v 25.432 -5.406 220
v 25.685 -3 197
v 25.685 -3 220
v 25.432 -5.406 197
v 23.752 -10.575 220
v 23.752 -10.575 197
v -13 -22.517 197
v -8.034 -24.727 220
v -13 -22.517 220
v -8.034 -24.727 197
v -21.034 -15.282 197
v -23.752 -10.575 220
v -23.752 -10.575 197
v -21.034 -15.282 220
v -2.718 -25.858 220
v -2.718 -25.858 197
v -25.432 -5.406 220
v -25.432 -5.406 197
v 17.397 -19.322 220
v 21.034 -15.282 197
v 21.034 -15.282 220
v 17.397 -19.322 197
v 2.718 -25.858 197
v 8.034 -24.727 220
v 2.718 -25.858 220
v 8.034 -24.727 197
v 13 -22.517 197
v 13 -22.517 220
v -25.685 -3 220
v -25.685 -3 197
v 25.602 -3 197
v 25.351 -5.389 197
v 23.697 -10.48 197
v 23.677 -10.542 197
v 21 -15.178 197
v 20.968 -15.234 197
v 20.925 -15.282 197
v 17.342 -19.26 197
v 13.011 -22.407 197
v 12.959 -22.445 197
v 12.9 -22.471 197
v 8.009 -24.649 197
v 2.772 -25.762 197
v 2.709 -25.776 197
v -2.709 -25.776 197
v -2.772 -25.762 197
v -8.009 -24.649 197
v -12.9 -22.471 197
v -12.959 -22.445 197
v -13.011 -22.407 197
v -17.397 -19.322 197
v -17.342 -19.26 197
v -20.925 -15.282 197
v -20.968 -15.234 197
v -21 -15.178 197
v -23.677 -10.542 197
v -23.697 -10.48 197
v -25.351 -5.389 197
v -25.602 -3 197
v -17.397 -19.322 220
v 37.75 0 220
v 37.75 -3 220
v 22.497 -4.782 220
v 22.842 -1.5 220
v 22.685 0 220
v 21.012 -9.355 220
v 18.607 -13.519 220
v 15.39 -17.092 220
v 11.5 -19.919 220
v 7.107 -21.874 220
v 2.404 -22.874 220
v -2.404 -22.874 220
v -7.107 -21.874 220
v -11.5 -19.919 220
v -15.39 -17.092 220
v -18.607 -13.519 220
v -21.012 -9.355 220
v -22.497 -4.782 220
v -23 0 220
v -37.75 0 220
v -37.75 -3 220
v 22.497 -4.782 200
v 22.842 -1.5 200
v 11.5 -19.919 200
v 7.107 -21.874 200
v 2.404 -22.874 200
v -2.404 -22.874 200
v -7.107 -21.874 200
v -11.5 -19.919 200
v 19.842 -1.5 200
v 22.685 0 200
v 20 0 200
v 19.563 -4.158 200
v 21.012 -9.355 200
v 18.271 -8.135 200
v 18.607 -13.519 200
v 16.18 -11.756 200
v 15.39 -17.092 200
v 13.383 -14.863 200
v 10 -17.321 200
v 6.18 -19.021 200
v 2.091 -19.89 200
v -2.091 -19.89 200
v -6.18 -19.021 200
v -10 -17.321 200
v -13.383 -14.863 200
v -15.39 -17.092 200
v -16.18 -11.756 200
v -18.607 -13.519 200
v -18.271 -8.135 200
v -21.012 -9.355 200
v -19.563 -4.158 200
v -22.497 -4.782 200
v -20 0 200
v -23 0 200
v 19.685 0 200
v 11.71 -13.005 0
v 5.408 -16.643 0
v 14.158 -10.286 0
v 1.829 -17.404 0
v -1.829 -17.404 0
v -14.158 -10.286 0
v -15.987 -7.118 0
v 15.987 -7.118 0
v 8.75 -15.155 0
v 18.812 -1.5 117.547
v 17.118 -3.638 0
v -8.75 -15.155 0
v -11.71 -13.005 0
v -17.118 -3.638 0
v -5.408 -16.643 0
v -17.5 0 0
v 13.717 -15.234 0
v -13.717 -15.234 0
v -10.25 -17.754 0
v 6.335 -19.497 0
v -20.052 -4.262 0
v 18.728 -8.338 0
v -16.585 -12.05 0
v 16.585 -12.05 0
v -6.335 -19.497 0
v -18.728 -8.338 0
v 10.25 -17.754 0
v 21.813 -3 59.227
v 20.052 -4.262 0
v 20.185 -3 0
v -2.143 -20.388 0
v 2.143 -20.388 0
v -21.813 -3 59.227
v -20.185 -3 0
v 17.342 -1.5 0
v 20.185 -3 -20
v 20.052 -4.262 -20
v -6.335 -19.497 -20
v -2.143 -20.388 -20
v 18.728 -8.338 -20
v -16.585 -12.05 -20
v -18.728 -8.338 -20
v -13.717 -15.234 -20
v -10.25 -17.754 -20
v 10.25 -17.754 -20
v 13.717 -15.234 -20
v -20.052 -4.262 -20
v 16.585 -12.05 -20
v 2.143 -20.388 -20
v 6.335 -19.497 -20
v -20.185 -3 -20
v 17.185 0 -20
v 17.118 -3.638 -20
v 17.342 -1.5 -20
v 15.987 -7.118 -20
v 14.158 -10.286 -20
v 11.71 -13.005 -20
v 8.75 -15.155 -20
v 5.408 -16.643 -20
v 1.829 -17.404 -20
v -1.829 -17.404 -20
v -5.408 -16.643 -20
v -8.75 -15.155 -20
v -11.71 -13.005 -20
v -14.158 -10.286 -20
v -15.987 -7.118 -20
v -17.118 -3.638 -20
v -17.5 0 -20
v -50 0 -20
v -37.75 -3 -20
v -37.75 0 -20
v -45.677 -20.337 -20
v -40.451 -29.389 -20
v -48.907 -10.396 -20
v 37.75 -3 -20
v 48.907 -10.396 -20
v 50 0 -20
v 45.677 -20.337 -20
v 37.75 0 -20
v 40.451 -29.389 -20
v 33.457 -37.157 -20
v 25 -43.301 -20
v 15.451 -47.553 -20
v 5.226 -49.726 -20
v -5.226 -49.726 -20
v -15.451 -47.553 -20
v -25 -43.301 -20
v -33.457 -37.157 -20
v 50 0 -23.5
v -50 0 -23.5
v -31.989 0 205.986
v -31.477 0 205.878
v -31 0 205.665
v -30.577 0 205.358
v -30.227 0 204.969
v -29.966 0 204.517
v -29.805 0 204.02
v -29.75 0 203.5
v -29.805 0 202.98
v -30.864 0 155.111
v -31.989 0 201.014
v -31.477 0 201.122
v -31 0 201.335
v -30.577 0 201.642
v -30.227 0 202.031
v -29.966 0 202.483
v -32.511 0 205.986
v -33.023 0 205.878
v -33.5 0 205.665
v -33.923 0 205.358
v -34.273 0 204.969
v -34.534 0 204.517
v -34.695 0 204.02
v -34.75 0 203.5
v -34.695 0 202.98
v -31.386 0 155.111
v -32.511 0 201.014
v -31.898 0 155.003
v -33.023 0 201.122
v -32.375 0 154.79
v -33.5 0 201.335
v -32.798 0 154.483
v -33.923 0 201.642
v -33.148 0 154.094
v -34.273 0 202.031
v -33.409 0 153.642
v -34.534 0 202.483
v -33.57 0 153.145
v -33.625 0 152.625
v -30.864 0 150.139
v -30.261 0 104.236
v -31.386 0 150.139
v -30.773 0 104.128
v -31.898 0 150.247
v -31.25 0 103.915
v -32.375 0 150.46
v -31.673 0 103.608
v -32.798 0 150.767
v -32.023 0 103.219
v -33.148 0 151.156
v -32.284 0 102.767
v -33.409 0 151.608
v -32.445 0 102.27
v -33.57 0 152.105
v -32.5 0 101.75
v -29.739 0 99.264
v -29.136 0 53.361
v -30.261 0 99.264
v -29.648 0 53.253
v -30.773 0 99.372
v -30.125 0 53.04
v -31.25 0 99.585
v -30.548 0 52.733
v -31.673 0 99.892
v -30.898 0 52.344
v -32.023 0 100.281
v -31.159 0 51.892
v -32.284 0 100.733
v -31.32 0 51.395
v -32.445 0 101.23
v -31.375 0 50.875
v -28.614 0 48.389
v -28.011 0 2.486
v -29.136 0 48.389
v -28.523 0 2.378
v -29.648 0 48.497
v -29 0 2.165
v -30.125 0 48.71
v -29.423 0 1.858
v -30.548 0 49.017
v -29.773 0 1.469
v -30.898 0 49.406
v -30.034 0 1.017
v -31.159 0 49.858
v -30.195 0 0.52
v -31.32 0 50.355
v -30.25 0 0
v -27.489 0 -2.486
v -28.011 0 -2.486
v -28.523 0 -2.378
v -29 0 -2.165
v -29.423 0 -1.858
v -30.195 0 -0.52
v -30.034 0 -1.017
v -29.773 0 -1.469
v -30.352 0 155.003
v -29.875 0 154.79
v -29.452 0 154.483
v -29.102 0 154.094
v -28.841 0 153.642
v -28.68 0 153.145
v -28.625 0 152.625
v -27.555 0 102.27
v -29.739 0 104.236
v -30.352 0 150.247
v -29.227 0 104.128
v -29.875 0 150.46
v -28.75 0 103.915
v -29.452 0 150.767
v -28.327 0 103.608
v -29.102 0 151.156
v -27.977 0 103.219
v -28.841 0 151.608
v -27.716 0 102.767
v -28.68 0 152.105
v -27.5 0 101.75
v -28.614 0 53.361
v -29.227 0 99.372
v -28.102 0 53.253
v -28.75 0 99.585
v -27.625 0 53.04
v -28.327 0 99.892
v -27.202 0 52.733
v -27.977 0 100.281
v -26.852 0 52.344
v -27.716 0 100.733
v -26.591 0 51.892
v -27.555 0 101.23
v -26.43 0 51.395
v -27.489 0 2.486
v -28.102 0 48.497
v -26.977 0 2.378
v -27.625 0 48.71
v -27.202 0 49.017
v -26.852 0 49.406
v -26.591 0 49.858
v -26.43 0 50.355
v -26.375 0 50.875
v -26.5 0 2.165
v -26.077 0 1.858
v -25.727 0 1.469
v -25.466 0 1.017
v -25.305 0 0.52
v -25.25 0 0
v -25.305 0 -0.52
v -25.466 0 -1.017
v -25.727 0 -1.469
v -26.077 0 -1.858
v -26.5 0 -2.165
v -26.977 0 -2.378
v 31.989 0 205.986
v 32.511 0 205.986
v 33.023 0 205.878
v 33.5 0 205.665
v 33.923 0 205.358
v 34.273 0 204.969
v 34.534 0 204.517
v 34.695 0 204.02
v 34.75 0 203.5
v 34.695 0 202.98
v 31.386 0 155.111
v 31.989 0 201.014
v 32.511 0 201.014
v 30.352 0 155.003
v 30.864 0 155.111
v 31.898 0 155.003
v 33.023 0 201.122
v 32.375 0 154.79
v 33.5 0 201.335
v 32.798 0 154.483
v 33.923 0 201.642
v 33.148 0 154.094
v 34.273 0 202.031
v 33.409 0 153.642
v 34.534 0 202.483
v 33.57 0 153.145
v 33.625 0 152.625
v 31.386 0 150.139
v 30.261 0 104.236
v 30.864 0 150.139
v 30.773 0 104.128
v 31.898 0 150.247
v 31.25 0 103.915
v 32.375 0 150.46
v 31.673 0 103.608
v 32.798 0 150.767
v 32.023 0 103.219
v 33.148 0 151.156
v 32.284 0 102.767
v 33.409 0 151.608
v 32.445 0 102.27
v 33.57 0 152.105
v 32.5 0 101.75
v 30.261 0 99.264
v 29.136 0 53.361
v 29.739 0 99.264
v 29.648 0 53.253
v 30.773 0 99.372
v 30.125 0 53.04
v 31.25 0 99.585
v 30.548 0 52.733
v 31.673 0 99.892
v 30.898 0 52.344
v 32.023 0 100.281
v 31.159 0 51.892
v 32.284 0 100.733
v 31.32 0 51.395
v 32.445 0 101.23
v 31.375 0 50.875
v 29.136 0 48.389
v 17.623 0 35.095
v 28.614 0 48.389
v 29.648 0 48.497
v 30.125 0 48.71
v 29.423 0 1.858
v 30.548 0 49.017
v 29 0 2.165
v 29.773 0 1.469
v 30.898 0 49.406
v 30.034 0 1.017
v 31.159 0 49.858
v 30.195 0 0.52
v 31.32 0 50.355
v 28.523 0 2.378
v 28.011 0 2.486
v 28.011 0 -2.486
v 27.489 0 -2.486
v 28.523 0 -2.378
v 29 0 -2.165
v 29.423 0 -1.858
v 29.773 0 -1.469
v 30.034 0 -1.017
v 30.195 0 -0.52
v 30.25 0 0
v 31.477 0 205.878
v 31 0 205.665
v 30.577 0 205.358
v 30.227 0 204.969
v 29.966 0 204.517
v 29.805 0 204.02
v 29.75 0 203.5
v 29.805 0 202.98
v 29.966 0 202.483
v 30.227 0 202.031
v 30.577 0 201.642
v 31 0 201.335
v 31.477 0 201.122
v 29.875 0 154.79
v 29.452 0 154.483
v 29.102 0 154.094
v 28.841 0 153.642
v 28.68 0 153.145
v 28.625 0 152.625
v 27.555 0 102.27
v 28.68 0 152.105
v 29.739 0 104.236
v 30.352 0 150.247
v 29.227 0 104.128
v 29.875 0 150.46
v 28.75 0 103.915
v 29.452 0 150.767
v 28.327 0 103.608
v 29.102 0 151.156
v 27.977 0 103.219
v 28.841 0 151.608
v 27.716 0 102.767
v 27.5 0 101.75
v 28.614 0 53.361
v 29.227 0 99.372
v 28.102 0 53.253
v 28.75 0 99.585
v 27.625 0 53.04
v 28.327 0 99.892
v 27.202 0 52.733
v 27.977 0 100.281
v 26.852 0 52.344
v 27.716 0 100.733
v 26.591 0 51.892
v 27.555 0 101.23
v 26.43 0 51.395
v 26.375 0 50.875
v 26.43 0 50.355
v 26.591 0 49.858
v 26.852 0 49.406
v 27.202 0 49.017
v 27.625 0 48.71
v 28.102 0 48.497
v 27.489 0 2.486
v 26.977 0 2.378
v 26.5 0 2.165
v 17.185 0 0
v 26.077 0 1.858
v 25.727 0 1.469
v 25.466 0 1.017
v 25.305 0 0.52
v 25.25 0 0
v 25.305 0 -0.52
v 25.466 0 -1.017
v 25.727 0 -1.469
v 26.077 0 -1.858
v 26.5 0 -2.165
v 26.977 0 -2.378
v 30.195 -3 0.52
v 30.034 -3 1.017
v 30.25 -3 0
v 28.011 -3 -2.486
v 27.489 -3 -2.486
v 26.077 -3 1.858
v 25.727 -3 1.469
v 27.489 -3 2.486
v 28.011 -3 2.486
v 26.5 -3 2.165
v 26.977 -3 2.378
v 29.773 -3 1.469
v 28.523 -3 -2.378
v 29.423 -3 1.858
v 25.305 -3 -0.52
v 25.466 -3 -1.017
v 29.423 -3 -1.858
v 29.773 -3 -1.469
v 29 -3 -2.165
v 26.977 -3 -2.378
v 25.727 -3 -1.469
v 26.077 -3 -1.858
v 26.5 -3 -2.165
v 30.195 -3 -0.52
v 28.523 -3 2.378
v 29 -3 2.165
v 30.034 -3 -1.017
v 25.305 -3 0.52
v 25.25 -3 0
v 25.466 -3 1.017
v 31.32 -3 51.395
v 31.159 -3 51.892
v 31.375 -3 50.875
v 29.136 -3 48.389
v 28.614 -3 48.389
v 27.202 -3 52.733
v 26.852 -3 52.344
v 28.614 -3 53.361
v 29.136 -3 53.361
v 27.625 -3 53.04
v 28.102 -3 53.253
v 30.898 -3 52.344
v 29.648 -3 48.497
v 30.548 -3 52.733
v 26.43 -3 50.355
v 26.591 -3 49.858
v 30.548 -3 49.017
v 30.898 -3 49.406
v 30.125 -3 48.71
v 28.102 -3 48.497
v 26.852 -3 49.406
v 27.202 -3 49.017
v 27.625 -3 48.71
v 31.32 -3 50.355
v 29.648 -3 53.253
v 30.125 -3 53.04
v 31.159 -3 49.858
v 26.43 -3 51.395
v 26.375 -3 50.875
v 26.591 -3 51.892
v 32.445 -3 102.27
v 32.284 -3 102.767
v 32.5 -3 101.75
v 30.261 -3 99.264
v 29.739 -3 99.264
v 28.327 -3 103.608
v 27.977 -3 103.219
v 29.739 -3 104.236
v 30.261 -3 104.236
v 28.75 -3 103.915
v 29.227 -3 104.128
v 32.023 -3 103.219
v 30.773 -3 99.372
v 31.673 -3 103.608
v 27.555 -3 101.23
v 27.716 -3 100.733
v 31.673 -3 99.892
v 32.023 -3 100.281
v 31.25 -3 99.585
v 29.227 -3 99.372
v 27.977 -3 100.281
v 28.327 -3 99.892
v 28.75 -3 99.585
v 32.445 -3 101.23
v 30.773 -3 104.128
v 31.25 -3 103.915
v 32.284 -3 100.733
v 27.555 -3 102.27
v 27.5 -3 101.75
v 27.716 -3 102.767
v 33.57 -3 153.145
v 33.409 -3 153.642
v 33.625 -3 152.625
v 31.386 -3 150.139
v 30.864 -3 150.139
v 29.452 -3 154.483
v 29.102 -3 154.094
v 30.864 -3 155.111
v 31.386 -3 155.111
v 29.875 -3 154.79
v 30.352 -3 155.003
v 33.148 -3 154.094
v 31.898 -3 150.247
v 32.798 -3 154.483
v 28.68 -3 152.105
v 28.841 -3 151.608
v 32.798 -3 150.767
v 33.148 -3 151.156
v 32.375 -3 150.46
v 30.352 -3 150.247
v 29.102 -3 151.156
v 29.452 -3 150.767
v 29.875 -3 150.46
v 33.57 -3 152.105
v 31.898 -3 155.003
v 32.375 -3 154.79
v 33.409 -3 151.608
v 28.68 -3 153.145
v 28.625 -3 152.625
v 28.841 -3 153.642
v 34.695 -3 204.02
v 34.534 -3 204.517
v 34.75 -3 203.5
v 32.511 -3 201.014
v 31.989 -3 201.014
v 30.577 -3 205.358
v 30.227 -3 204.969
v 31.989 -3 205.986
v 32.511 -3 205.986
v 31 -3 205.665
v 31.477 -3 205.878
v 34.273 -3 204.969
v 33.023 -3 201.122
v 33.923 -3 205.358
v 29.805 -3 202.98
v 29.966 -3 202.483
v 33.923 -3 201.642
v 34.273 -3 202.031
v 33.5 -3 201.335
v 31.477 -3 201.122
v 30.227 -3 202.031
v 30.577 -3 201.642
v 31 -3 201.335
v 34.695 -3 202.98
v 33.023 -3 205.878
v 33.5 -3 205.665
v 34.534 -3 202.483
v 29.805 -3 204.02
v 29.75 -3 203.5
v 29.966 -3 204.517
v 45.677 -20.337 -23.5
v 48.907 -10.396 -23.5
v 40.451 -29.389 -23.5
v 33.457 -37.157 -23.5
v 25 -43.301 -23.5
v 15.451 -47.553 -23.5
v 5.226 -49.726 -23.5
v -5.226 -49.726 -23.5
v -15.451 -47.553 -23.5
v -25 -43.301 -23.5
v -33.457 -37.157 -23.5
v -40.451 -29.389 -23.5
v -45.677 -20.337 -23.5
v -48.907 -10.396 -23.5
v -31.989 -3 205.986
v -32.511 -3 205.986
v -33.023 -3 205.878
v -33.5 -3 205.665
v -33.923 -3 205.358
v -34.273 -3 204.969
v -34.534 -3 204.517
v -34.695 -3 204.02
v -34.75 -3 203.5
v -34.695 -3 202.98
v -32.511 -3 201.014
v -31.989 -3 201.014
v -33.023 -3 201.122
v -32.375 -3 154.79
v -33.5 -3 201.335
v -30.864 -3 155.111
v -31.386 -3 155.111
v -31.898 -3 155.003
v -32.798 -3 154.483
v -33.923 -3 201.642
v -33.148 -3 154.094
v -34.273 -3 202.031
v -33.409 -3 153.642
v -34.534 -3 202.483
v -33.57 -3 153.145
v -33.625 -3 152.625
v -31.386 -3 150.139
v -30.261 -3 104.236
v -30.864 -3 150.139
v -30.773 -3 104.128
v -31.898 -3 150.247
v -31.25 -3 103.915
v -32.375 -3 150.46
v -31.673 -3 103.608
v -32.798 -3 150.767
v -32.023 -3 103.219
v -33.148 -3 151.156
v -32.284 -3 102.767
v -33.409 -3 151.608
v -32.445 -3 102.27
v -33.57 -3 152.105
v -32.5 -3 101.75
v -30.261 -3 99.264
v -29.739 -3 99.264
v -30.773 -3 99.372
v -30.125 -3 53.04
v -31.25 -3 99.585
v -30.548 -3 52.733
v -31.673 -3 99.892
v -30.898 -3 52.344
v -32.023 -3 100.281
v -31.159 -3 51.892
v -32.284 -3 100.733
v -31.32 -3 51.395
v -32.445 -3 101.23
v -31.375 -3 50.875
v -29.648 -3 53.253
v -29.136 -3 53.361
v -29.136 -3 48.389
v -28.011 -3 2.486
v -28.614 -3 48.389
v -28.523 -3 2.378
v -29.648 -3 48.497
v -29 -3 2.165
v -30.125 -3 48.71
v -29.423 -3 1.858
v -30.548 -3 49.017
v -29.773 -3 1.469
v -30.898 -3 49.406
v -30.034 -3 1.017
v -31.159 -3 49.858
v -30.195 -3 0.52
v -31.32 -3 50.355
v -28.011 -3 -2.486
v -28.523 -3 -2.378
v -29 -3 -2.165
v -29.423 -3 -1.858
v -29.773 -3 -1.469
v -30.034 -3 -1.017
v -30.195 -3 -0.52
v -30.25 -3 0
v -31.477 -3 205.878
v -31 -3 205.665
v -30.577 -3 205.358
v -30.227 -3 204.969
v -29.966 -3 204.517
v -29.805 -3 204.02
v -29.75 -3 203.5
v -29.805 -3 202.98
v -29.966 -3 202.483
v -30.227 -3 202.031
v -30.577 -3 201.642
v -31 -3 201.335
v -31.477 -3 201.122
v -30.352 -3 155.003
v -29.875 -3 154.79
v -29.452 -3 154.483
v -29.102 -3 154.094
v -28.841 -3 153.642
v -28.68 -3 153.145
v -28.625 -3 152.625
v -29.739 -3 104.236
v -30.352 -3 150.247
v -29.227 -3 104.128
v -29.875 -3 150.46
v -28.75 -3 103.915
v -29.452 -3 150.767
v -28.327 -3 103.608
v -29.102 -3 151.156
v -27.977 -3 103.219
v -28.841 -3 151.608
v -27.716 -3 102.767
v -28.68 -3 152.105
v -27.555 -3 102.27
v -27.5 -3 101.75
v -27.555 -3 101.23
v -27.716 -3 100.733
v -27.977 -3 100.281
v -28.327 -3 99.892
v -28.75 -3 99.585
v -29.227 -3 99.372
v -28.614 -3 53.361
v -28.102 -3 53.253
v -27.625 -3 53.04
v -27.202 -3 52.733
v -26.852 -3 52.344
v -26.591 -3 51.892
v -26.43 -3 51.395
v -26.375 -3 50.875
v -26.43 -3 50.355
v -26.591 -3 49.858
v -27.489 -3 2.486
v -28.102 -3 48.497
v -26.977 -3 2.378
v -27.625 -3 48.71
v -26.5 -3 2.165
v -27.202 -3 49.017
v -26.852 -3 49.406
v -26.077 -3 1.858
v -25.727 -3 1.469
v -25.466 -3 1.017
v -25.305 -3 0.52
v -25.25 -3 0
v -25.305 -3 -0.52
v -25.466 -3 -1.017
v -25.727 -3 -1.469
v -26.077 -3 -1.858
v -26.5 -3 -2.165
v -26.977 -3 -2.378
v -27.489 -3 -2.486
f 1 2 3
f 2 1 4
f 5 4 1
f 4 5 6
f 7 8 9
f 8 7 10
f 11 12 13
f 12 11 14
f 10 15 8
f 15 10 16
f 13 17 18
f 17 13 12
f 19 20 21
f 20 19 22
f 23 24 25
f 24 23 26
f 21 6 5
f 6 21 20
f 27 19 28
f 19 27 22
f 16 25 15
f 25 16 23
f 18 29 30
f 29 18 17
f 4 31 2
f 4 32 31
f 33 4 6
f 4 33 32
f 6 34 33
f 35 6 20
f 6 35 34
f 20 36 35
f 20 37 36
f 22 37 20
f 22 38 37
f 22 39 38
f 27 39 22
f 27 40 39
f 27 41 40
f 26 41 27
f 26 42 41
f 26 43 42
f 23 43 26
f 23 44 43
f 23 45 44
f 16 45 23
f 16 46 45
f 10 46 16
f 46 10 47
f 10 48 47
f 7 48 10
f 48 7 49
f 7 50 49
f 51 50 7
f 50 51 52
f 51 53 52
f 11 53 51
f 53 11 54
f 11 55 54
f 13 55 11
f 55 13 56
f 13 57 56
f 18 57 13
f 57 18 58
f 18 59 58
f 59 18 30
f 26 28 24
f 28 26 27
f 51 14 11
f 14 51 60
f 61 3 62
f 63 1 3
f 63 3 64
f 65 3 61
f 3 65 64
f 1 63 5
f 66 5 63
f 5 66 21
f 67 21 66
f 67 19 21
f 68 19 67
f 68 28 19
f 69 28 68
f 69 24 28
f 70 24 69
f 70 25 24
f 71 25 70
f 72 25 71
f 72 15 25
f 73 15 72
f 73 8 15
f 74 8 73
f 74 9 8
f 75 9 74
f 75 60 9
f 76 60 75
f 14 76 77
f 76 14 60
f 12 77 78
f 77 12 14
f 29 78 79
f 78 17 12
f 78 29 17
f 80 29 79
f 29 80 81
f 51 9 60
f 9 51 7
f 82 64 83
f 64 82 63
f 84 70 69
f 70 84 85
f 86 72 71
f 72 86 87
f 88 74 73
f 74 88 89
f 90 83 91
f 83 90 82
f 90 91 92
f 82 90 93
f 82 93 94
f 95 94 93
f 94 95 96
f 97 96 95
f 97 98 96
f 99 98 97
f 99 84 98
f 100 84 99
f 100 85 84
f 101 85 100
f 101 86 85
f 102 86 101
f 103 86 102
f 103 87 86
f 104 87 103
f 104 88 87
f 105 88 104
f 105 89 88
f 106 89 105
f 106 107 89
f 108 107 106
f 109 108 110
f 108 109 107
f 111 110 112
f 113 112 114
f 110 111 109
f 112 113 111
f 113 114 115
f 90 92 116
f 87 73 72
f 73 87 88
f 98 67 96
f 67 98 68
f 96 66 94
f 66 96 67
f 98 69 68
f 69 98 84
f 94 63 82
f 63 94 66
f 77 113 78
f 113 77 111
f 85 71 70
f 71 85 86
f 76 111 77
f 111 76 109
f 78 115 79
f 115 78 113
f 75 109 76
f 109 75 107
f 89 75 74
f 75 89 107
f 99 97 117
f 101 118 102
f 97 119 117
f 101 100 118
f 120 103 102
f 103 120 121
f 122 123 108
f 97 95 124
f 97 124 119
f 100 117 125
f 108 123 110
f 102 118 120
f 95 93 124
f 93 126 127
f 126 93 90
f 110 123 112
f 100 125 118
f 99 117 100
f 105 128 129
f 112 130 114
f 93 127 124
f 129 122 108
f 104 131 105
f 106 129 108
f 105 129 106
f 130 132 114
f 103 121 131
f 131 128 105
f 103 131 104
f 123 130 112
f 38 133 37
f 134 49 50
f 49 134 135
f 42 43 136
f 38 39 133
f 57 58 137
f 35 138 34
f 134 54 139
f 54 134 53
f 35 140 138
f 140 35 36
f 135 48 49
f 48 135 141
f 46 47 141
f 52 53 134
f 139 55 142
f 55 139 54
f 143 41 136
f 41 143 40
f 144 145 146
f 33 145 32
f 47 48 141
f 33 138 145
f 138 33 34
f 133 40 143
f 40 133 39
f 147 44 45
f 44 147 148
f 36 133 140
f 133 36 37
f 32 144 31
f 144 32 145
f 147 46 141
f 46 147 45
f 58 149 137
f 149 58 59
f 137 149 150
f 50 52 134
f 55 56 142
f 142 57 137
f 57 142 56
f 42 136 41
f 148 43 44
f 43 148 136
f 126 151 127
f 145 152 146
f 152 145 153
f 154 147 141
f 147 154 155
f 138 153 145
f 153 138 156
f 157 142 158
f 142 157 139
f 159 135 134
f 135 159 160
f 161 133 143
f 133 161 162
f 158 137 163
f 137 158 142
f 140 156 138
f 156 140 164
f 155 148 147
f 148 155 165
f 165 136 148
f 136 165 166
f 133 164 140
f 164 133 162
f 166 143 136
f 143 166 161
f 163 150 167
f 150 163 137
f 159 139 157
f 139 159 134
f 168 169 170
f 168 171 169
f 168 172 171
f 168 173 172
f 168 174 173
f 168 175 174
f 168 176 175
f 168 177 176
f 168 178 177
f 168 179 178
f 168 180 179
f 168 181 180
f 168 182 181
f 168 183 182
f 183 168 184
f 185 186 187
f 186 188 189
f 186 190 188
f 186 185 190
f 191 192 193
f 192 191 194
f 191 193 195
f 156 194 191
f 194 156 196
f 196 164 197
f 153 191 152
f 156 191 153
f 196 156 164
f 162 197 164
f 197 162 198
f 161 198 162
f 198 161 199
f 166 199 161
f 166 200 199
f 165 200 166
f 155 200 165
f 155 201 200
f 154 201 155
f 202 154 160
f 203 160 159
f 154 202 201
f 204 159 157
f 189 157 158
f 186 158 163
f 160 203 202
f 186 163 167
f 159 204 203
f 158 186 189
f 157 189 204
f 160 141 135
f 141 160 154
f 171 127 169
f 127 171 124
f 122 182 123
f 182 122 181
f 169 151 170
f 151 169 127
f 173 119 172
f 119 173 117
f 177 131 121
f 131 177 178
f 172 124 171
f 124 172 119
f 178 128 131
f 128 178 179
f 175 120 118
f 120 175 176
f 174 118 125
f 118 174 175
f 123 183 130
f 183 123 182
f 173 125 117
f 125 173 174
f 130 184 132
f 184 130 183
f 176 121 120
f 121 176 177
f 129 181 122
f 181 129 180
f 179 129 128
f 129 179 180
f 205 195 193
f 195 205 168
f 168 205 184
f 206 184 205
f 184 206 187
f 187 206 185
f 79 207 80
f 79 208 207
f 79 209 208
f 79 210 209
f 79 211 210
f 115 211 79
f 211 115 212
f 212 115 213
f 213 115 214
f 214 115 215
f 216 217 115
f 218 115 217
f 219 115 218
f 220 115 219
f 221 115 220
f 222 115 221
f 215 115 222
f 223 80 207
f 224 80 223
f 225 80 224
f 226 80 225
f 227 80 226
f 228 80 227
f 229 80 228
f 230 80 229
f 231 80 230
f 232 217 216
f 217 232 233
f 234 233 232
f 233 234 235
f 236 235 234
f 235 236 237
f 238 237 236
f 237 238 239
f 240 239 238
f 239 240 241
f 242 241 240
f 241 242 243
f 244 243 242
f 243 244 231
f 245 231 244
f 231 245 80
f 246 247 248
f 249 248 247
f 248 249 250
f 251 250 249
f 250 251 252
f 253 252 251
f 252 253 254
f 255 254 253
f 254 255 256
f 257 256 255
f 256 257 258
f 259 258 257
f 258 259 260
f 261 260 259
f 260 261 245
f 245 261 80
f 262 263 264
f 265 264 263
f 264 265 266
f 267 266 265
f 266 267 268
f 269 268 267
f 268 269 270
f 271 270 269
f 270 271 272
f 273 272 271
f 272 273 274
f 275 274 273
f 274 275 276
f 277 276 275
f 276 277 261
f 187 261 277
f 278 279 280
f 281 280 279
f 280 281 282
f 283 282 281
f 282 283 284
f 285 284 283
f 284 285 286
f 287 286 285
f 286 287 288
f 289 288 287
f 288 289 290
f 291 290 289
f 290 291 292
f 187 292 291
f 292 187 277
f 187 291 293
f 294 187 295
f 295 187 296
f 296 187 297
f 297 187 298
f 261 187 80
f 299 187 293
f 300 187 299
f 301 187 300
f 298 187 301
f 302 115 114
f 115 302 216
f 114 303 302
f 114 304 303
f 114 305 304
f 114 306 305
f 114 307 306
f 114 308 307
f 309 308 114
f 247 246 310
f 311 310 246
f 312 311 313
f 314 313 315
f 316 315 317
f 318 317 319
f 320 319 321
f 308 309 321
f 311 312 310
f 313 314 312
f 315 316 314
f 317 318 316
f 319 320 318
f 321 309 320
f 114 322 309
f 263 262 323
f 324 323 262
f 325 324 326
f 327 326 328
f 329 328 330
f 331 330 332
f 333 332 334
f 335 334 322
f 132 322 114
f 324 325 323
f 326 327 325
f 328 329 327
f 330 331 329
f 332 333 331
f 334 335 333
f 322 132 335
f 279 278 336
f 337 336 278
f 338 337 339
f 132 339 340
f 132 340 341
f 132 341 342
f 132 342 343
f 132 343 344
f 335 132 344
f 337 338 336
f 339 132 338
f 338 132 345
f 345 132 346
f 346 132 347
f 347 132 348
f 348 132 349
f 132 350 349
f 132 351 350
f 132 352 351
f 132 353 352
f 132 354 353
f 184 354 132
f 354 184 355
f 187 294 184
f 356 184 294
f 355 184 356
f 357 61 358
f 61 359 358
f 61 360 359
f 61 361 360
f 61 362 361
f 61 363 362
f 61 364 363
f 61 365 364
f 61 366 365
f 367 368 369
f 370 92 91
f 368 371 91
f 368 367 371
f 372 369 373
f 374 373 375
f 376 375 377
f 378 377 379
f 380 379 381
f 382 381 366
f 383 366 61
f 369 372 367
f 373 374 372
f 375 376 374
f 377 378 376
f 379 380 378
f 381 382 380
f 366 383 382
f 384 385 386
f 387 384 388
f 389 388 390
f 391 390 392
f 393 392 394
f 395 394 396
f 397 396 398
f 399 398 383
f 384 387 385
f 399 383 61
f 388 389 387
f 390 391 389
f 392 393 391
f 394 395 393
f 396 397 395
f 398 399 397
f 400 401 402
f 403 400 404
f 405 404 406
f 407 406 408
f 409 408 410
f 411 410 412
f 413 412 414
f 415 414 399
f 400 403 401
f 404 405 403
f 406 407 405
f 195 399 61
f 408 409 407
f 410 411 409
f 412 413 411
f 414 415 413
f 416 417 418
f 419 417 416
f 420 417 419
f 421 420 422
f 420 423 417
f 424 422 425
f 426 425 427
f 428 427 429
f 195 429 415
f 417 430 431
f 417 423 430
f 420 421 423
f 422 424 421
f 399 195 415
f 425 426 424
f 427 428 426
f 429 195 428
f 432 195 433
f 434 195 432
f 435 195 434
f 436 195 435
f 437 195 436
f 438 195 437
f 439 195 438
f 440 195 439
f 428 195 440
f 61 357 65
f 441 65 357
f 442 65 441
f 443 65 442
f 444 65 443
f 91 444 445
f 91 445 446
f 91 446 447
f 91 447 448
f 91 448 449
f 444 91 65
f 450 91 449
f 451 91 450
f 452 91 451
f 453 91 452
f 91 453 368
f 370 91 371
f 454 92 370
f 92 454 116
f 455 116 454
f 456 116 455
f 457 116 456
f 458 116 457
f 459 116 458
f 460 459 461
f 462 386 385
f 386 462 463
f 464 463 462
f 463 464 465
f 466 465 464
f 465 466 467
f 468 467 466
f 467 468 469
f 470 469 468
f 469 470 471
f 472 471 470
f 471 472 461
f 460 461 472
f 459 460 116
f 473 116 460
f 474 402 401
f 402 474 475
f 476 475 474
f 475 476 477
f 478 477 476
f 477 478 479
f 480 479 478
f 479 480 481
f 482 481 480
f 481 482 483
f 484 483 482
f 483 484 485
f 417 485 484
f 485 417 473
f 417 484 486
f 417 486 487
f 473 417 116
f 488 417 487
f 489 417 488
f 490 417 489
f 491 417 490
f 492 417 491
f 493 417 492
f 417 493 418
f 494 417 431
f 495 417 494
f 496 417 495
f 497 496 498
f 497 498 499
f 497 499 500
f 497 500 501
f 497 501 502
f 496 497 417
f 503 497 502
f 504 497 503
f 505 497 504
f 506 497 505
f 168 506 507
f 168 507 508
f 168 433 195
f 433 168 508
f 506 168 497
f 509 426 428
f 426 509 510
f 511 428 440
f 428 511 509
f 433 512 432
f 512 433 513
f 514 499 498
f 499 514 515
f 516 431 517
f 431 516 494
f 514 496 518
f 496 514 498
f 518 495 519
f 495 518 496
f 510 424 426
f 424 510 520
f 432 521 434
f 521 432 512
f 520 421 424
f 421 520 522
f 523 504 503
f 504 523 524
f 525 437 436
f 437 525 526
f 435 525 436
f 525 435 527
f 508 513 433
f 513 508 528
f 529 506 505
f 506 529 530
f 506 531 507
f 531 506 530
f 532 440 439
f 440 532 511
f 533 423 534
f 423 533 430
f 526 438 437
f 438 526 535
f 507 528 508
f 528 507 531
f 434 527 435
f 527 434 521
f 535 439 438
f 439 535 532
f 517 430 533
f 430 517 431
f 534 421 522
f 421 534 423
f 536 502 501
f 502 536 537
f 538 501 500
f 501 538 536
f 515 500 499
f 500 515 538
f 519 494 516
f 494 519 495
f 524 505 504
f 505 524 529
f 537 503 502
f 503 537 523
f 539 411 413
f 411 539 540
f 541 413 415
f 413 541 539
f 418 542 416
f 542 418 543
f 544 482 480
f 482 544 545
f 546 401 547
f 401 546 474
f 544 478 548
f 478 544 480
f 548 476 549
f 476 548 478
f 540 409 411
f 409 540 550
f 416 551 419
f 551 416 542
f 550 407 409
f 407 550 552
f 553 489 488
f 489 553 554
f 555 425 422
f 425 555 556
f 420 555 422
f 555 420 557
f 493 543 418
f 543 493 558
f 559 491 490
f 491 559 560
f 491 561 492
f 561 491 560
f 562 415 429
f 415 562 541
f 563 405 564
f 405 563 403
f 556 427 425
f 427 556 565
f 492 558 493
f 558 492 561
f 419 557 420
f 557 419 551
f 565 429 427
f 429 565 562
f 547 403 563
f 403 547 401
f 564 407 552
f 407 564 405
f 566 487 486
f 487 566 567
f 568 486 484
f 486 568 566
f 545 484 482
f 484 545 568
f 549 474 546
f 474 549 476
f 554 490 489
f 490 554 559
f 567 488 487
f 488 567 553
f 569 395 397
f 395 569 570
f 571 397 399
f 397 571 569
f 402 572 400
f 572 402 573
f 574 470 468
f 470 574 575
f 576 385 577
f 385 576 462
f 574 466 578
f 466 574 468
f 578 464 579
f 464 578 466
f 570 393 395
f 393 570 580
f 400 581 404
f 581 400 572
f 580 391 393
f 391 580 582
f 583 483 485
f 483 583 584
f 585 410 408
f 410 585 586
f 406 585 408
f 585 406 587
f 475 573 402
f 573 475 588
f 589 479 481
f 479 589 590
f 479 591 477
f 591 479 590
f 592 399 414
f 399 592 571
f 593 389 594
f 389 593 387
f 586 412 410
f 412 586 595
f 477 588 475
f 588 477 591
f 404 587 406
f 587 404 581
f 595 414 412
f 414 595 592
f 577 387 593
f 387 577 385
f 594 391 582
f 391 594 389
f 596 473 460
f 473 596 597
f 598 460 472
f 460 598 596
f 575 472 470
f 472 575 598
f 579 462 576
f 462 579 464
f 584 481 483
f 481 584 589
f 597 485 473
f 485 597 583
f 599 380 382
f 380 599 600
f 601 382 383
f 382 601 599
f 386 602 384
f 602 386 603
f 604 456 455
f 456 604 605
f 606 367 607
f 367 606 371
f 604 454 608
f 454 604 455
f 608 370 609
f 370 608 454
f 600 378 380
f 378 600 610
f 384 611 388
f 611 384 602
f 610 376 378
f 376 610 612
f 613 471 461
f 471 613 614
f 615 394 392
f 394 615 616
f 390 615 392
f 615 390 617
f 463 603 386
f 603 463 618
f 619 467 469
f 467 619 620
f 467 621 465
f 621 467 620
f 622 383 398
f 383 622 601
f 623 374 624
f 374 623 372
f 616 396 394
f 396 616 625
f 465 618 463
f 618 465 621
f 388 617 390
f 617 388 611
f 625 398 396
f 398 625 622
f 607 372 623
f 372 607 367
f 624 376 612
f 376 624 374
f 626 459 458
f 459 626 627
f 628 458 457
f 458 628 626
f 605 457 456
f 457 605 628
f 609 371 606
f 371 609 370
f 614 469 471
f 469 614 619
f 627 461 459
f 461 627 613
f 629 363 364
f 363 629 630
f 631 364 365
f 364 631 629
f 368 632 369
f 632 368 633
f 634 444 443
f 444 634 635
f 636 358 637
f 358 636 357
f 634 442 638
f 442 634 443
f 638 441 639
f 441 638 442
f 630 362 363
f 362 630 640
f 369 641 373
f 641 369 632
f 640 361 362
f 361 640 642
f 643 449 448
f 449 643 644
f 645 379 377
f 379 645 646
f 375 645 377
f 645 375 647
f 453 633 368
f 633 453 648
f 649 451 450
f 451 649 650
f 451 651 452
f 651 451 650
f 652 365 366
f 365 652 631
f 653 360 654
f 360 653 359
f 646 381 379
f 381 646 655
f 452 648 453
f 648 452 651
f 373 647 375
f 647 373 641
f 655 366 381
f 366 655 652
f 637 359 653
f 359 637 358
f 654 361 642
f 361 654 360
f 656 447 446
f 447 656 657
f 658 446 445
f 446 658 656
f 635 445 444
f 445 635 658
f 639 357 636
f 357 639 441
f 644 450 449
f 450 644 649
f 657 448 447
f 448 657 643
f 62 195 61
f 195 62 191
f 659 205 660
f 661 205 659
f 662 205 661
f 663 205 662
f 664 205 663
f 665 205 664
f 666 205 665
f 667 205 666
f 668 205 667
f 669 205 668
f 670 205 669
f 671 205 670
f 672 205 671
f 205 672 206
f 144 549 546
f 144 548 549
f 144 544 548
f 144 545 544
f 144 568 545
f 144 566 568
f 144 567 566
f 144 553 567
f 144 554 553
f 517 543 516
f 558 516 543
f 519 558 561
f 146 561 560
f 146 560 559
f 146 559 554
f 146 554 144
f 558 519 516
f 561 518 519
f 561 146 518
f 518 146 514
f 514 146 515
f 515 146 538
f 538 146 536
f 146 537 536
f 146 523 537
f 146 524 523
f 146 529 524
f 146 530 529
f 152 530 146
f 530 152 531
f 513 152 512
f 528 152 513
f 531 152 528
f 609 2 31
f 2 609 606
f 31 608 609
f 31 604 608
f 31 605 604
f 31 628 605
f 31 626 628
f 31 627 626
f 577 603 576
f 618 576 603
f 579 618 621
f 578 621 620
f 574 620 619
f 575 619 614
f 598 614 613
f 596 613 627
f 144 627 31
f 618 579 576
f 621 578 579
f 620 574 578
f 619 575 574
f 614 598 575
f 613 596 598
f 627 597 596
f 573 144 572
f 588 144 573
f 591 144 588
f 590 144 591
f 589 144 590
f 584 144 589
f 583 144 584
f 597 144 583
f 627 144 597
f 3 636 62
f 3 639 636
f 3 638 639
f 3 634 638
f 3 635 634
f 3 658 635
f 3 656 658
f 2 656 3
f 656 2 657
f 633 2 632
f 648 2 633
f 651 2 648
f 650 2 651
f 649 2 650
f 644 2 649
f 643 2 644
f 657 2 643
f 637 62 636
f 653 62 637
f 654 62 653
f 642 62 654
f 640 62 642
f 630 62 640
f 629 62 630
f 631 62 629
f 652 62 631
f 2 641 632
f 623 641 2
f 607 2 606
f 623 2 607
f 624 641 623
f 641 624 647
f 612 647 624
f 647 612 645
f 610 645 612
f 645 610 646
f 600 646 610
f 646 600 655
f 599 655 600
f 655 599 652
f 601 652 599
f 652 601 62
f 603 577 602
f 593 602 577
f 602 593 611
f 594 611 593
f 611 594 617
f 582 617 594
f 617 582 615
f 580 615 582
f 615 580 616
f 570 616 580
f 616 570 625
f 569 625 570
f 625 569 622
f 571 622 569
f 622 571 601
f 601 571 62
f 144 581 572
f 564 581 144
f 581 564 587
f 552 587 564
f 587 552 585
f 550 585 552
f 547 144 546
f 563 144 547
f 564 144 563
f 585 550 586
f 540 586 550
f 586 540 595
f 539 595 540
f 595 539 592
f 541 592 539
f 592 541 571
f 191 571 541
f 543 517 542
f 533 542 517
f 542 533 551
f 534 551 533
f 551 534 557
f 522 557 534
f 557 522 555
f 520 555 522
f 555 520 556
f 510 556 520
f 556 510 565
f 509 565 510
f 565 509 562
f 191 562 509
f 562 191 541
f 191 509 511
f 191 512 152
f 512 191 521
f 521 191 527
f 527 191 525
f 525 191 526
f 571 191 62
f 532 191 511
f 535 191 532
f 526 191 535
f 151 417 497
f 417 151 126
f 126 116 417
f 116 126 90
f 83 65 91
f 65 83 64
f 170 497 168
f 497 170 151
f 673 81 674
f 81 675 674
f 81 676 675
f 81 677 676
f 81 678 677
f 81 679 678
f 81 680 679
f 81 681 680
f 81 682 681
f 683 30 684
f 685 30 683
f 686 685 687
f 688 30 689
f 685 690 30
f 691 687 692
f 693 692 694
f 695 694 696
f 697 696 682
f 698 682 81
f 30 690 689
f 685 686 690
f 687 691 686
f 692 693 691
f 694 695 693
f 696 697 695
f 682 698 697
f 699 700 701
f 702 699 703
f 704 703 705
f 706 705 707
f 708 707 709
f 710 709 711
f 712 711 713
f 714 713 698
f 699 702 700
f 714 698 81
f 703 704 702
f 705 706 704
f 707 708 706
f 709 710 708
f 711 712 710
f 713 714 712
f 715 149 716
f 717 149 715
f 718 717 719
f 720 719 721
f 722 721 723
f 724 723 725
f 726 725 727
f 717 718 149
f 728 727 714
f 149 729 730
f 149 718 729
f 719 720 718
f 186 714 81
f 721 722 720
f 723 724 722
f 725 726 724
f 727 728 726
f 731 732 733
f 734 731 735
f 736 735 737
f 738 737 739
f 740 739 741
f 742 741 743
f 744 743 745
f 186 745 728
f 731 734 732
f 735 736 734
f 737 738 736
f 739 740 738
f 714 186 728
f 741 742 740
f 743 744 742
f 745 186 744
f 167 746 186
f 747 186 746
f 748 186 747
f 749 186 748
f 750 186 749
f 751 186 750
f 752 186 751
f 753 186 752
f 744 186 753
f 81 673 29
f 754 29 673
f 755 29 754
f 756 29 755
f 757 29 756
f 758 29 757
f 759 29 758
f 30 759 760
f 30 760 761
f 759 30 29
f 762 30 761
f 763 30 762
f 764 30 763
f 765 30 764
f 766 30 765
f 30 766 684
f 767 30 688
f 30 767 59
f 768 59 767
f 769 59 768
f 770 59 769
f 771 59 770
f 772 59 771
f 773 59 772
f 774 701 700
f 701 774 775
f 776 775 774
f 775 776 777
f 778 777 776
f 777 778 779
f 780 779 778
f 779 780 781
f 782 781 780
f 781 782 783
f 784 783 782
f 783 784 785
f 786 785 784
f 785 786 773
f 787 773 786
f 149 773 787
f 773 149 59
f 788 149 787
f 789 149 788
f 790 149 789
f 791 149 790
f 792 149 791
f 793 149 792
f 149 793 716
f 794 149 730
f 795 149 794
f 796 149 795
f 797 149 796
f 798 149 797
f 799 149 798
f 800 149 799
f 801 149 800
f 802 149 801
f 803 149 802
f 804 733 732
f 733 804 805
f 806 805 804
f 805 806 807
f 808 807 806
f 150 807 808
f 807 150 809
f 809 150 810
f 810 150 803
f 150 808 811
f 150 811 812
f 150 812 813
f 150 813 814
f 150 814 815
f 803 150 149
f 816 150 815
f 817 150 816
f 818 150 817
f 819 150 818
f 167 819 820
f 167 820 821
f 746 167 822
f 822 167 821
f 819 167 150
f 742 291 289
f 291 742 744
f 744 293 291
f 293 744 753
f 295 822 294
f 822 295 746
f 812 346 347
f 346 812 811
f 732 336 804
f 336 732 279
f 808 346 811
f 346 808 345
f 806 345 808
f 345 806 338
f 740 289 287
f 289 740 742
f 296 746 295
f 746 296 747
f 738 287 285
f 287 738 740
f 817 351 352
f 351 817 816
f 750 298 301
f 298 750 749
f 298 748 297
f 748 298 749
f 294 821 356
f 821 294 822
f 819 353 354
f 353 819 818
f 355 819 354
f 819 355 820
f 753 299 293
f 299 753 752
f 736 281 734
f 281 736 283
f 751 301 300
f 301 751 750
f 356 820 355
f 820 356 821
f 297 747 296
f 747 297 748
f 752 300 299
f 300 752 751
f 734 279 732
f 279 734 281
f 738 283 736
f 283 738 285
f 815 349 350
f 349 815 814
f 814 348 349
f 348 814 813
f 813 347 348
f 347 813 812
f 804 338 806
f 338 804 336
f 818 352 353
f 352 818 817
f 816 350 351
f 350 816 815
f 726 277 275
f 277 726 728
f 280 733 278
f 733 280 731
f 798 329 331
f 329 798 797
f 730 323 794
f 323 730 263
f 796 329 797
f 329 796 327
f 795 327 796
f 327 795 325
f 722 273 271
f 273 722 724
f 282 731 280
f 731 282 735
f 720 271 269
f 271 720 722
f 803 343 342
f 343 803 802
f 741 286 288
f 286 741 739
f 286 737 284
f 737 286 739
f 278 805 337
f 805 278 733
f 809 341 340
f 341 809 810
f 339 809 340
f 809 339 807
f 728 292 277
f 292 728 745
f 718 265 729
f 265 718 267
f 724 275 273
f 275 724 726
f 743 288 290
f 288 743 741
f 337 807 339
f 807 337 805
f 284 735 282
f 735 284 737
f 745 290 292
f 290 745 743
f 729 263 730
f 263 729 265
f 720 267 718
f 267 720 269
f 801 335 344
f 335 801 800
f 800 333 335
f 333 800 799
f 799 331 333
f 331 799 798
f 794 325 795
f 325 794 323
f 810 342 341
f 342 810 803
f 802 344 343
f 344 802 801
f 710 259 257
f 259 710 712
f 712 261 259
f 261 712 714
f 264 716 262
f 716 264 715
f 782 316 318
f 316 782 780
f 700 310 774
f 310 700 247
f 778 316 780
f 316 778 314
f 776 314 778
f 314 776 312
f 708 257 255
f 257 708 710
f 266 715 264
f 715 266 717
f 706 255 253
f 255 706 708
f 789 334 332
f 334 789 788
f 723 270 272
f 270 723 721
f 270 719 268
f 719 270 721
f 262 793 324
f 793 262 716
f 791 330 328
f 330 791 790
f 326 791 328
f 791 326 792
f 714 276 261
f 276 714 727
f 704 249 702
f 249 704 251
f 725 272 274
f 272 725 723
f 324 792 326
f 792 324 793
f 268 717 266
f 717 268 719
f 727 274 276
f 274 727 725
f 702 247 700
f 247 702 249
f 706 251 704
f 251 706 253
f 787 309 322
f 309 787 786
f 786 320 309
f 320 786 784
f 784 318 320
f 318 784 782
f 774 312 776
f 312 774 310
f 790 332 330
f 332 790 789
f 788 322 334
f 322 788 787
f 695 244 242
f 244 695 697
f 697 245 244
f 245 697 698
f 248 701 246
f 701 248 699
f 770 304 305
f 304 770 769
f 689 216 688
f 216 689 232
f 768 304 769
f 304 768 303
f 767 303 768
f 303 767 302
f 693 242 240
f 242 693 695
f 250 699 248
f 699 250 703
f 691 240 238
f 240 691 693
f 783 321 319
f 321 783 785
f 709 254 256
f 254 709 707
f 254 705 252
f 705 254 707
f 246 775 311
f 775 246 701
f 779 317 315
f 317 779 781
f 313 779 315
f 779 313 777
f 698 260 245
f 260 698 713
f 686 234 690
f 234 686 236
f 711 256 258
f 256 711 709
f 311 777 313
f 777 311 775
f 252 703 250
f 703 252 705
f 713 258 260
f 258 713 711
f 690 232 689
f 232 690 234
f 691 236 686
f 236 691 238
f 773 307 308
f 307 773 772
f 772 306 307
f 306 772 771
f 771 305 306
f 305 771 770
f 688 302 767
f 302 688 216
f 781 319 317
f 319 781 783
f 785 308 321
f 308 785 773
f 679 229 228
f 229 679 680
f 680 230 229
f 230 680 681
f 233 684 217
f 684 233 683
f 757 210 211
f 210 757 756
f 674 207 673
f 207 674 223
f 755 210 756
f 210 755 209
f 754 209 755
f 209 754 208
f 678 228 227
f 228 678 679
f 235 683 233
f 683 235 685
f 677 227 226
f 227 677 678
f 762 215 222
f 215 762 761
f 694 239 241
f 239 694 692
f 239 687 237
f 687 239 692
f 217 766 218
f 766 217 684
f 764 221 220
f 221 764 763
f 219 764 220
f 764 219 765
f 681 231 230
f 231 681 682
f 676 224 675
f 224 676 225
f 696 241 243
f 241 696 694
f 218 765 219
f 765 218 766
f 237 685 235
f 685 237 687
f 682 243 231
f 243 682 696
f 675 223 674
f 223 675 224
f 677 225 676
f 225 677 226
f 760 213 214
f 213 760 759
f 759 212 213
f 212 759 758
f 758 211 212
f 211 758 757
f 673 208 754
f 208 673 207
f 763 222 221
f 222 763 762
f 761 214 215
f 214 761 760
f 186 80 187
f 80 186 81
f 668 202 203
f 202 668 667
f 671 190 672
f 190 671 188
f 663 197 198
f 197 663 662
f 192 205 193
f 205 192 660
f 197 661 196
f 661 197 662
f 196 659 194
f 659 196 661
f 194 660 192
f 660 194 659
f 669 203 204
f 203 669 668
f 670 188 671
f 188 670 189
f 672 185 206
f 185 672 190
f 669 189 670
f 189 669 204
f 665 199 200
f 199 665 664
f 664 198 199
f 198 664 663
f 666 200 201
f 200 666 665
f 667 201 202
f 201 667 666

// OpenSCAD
//////////////////////////////////////////////
//  ***TeMoG - Tentacle Mold Generator***   //
//  by Jonas Jørgensen (jonj@sdu.dk) 2020   //
//                                          //
//  Shared under a Creative Commons         //
//  Attribution-ShareAlike (CC BY-SA 3.0)   //
//  license                                 //
//////////////////////////////////////////////

//Part 1 - Outer Mold
//Note: 3D print two copies of this mold part

$fn=30; //Set to 200 when generating the molds for 3D printing

//Global variables
moldWallThickness = 3;
siliconeThickness=3; //Wall thickness of the silicone tentacle 

//Main cone part
h = 200; //Cone height
maxDiam = 40; 
minDiam = 35; 

////Assembly on the sides of mold
numberOfHoles = 4;
screwSize=5;
assemblyWidth= 22;

//Bottom
straightHeightBottom = 20;
bottomThickness=3.5;
footDiam=100; //Foot for the mold

//LDR holder
LDRHolderThickness=0;
LDRHolderDiam=minDiam+3;
LDRHoleDepth=8;
LDRDiam=6; 
LDRWireHolesDist=3;
LDRHoleDist=LDRHolderDiam/2-LDRDiam;
LDRNumber=3;

//Top part
straightHeight= 20; 
wiresDiameter=5; 

//Finishing mold:
finMoldHeight=25;
finMoldWidth=30;
supportMoldLength=60;
supportMoldWidth=30;
FinalBottomThickness =8;


difference(){

union() {

difference(){

//Top part of mold
translate ([0,0,h-3]) cylinder(straightHeight+3,d2=maxDiam+6+moldWallThickness*2,d1=maxDiam+6+moldWallThickness*2);
translate ([0,0,h]) cylinder(straightHeight,d2=maxDiam+6,d1=maxDiam+6);
cylinder(h,d2=maxDiam,d1=minDiam);

}

//Main cone
difference(){
cylinder(h,d2=maxDiam+6+moldWallThickness*2,d1=minDiam+moldWallThickness*2);
cylinder(h,d2=maxDiam,d1=minDiam);

}

//Straight bottom part
translate ([0,0,-straightHeightBottom]) difference(){
cylinder(straightHeightBottom,d2=minDiam+moldWallThickness*2,d1=minDiam+moldWallThickness*2);
cylinder(straightHeightBottom,d2=minDiam,d1=minDiam);

}

//Bottom and foot
translate ([0,0,-straightHeightBottom-bottomThickness]) cylinder(bottomThickness,d2=footDiam,d1=footDiam);

////Screw holders at 1st side////

translate([0,-moldWallThickness,0]){

//Holes    
difference(){
translate ([(minDiam+maxDiam)/4-moldWallThickness,0,-straightHeightBottom-bottomThickness]) cube([assemblyWidth,moldWallThickness*2,h+straightHeightBottom+bottomThickness+straightHeight]); //Long plate
   
d=(h+straightHeightBottom+bottomThickness+straightHeight-40)/numberOfHoles; //Distance between holes

for(k = [0:numberOfHoles]){
rotate(90, [1, 0, 0]) translate ([(minDiam+maxDiam)/4-moldWallThickness+12+4.5*(k/numberOfHoles),-straightHeightBottom+20+(k)*d,-moldWallThickness]) 
cylinder(moldWallThickness*2,d2=screwSize,d1=screwSize);
}

cylinder(h,d2=maxDiam,d1=minDiam); //Remove inner parts of cone again
translate ([0,0,h]) cylinder(straightHeight,d2=maxDiam+6,d1=maxDiam+6); //Remove inner parts of top again
translate ([0,0,-straightHeightBottom]) cylinder(straightHeightBottom,d2=minDiam,d1=minDiam);//Remove inner parts of bottom again
}

}

////Screw holders at 2nd side////

rotate(180, [0,0,1]){
    
//Holes    
difference(){
translate ([(minDiam+maxDiam)/4-moldWallThickness,-moldWallThickness,-straightHeightBottom-bottomThickness]) cube([assemblyWidth,moldWallThickness*2,h+straightHeightBottom+bottomThickness+straightHeight]); //Long plate
   
d=(h+straightHeightBottom+bottomThickness+straightHeight-40)/numberOfHoles; //Distance between holes

for(k = [0:numberOfHoles]){
rotate(90, [1, 0, 0]) translate ([(minDiam+maxDiam)/4-moldWallThickness+12+4.5*(k/numberOfHoles),-straightHeightBottom+20+(k)*d,-moldWallThickness]) 
cylinder(moldWallThickness,d2=screwSize,d1=screwSize);
}

cylinder(h,d2=maxDiam,d1=minDiam); //Remove inner parts of cone again
translate ([0,0,h]) cylinder(straightHeight,d2=maxDiam+6,d1=maxDiam+6); //Remove inner parts of top again
translate ([0,0,-straightHeightBottom]) cylinder(straightHeightBottom,d2=minDiam,d1=minDiam);//Remove inner parts of bottom again

}

}

}

translate ([-footDiam/2,0,-straightHeightBottom-bottomThickness]) cube([footDiam,footDiam,h+straightHeight+straightHeightBottom+bottomThickness]); //Cut half of the mold off (the side on the positive part of the y-axis)
    

//Make cutout at bottom for LDR holder
translate ([0,0,-straightHeightBottom]) cylinder(LDRHolderThickness,d2=LDRHolderDiam,d1=LDRHolderDiam);

}
